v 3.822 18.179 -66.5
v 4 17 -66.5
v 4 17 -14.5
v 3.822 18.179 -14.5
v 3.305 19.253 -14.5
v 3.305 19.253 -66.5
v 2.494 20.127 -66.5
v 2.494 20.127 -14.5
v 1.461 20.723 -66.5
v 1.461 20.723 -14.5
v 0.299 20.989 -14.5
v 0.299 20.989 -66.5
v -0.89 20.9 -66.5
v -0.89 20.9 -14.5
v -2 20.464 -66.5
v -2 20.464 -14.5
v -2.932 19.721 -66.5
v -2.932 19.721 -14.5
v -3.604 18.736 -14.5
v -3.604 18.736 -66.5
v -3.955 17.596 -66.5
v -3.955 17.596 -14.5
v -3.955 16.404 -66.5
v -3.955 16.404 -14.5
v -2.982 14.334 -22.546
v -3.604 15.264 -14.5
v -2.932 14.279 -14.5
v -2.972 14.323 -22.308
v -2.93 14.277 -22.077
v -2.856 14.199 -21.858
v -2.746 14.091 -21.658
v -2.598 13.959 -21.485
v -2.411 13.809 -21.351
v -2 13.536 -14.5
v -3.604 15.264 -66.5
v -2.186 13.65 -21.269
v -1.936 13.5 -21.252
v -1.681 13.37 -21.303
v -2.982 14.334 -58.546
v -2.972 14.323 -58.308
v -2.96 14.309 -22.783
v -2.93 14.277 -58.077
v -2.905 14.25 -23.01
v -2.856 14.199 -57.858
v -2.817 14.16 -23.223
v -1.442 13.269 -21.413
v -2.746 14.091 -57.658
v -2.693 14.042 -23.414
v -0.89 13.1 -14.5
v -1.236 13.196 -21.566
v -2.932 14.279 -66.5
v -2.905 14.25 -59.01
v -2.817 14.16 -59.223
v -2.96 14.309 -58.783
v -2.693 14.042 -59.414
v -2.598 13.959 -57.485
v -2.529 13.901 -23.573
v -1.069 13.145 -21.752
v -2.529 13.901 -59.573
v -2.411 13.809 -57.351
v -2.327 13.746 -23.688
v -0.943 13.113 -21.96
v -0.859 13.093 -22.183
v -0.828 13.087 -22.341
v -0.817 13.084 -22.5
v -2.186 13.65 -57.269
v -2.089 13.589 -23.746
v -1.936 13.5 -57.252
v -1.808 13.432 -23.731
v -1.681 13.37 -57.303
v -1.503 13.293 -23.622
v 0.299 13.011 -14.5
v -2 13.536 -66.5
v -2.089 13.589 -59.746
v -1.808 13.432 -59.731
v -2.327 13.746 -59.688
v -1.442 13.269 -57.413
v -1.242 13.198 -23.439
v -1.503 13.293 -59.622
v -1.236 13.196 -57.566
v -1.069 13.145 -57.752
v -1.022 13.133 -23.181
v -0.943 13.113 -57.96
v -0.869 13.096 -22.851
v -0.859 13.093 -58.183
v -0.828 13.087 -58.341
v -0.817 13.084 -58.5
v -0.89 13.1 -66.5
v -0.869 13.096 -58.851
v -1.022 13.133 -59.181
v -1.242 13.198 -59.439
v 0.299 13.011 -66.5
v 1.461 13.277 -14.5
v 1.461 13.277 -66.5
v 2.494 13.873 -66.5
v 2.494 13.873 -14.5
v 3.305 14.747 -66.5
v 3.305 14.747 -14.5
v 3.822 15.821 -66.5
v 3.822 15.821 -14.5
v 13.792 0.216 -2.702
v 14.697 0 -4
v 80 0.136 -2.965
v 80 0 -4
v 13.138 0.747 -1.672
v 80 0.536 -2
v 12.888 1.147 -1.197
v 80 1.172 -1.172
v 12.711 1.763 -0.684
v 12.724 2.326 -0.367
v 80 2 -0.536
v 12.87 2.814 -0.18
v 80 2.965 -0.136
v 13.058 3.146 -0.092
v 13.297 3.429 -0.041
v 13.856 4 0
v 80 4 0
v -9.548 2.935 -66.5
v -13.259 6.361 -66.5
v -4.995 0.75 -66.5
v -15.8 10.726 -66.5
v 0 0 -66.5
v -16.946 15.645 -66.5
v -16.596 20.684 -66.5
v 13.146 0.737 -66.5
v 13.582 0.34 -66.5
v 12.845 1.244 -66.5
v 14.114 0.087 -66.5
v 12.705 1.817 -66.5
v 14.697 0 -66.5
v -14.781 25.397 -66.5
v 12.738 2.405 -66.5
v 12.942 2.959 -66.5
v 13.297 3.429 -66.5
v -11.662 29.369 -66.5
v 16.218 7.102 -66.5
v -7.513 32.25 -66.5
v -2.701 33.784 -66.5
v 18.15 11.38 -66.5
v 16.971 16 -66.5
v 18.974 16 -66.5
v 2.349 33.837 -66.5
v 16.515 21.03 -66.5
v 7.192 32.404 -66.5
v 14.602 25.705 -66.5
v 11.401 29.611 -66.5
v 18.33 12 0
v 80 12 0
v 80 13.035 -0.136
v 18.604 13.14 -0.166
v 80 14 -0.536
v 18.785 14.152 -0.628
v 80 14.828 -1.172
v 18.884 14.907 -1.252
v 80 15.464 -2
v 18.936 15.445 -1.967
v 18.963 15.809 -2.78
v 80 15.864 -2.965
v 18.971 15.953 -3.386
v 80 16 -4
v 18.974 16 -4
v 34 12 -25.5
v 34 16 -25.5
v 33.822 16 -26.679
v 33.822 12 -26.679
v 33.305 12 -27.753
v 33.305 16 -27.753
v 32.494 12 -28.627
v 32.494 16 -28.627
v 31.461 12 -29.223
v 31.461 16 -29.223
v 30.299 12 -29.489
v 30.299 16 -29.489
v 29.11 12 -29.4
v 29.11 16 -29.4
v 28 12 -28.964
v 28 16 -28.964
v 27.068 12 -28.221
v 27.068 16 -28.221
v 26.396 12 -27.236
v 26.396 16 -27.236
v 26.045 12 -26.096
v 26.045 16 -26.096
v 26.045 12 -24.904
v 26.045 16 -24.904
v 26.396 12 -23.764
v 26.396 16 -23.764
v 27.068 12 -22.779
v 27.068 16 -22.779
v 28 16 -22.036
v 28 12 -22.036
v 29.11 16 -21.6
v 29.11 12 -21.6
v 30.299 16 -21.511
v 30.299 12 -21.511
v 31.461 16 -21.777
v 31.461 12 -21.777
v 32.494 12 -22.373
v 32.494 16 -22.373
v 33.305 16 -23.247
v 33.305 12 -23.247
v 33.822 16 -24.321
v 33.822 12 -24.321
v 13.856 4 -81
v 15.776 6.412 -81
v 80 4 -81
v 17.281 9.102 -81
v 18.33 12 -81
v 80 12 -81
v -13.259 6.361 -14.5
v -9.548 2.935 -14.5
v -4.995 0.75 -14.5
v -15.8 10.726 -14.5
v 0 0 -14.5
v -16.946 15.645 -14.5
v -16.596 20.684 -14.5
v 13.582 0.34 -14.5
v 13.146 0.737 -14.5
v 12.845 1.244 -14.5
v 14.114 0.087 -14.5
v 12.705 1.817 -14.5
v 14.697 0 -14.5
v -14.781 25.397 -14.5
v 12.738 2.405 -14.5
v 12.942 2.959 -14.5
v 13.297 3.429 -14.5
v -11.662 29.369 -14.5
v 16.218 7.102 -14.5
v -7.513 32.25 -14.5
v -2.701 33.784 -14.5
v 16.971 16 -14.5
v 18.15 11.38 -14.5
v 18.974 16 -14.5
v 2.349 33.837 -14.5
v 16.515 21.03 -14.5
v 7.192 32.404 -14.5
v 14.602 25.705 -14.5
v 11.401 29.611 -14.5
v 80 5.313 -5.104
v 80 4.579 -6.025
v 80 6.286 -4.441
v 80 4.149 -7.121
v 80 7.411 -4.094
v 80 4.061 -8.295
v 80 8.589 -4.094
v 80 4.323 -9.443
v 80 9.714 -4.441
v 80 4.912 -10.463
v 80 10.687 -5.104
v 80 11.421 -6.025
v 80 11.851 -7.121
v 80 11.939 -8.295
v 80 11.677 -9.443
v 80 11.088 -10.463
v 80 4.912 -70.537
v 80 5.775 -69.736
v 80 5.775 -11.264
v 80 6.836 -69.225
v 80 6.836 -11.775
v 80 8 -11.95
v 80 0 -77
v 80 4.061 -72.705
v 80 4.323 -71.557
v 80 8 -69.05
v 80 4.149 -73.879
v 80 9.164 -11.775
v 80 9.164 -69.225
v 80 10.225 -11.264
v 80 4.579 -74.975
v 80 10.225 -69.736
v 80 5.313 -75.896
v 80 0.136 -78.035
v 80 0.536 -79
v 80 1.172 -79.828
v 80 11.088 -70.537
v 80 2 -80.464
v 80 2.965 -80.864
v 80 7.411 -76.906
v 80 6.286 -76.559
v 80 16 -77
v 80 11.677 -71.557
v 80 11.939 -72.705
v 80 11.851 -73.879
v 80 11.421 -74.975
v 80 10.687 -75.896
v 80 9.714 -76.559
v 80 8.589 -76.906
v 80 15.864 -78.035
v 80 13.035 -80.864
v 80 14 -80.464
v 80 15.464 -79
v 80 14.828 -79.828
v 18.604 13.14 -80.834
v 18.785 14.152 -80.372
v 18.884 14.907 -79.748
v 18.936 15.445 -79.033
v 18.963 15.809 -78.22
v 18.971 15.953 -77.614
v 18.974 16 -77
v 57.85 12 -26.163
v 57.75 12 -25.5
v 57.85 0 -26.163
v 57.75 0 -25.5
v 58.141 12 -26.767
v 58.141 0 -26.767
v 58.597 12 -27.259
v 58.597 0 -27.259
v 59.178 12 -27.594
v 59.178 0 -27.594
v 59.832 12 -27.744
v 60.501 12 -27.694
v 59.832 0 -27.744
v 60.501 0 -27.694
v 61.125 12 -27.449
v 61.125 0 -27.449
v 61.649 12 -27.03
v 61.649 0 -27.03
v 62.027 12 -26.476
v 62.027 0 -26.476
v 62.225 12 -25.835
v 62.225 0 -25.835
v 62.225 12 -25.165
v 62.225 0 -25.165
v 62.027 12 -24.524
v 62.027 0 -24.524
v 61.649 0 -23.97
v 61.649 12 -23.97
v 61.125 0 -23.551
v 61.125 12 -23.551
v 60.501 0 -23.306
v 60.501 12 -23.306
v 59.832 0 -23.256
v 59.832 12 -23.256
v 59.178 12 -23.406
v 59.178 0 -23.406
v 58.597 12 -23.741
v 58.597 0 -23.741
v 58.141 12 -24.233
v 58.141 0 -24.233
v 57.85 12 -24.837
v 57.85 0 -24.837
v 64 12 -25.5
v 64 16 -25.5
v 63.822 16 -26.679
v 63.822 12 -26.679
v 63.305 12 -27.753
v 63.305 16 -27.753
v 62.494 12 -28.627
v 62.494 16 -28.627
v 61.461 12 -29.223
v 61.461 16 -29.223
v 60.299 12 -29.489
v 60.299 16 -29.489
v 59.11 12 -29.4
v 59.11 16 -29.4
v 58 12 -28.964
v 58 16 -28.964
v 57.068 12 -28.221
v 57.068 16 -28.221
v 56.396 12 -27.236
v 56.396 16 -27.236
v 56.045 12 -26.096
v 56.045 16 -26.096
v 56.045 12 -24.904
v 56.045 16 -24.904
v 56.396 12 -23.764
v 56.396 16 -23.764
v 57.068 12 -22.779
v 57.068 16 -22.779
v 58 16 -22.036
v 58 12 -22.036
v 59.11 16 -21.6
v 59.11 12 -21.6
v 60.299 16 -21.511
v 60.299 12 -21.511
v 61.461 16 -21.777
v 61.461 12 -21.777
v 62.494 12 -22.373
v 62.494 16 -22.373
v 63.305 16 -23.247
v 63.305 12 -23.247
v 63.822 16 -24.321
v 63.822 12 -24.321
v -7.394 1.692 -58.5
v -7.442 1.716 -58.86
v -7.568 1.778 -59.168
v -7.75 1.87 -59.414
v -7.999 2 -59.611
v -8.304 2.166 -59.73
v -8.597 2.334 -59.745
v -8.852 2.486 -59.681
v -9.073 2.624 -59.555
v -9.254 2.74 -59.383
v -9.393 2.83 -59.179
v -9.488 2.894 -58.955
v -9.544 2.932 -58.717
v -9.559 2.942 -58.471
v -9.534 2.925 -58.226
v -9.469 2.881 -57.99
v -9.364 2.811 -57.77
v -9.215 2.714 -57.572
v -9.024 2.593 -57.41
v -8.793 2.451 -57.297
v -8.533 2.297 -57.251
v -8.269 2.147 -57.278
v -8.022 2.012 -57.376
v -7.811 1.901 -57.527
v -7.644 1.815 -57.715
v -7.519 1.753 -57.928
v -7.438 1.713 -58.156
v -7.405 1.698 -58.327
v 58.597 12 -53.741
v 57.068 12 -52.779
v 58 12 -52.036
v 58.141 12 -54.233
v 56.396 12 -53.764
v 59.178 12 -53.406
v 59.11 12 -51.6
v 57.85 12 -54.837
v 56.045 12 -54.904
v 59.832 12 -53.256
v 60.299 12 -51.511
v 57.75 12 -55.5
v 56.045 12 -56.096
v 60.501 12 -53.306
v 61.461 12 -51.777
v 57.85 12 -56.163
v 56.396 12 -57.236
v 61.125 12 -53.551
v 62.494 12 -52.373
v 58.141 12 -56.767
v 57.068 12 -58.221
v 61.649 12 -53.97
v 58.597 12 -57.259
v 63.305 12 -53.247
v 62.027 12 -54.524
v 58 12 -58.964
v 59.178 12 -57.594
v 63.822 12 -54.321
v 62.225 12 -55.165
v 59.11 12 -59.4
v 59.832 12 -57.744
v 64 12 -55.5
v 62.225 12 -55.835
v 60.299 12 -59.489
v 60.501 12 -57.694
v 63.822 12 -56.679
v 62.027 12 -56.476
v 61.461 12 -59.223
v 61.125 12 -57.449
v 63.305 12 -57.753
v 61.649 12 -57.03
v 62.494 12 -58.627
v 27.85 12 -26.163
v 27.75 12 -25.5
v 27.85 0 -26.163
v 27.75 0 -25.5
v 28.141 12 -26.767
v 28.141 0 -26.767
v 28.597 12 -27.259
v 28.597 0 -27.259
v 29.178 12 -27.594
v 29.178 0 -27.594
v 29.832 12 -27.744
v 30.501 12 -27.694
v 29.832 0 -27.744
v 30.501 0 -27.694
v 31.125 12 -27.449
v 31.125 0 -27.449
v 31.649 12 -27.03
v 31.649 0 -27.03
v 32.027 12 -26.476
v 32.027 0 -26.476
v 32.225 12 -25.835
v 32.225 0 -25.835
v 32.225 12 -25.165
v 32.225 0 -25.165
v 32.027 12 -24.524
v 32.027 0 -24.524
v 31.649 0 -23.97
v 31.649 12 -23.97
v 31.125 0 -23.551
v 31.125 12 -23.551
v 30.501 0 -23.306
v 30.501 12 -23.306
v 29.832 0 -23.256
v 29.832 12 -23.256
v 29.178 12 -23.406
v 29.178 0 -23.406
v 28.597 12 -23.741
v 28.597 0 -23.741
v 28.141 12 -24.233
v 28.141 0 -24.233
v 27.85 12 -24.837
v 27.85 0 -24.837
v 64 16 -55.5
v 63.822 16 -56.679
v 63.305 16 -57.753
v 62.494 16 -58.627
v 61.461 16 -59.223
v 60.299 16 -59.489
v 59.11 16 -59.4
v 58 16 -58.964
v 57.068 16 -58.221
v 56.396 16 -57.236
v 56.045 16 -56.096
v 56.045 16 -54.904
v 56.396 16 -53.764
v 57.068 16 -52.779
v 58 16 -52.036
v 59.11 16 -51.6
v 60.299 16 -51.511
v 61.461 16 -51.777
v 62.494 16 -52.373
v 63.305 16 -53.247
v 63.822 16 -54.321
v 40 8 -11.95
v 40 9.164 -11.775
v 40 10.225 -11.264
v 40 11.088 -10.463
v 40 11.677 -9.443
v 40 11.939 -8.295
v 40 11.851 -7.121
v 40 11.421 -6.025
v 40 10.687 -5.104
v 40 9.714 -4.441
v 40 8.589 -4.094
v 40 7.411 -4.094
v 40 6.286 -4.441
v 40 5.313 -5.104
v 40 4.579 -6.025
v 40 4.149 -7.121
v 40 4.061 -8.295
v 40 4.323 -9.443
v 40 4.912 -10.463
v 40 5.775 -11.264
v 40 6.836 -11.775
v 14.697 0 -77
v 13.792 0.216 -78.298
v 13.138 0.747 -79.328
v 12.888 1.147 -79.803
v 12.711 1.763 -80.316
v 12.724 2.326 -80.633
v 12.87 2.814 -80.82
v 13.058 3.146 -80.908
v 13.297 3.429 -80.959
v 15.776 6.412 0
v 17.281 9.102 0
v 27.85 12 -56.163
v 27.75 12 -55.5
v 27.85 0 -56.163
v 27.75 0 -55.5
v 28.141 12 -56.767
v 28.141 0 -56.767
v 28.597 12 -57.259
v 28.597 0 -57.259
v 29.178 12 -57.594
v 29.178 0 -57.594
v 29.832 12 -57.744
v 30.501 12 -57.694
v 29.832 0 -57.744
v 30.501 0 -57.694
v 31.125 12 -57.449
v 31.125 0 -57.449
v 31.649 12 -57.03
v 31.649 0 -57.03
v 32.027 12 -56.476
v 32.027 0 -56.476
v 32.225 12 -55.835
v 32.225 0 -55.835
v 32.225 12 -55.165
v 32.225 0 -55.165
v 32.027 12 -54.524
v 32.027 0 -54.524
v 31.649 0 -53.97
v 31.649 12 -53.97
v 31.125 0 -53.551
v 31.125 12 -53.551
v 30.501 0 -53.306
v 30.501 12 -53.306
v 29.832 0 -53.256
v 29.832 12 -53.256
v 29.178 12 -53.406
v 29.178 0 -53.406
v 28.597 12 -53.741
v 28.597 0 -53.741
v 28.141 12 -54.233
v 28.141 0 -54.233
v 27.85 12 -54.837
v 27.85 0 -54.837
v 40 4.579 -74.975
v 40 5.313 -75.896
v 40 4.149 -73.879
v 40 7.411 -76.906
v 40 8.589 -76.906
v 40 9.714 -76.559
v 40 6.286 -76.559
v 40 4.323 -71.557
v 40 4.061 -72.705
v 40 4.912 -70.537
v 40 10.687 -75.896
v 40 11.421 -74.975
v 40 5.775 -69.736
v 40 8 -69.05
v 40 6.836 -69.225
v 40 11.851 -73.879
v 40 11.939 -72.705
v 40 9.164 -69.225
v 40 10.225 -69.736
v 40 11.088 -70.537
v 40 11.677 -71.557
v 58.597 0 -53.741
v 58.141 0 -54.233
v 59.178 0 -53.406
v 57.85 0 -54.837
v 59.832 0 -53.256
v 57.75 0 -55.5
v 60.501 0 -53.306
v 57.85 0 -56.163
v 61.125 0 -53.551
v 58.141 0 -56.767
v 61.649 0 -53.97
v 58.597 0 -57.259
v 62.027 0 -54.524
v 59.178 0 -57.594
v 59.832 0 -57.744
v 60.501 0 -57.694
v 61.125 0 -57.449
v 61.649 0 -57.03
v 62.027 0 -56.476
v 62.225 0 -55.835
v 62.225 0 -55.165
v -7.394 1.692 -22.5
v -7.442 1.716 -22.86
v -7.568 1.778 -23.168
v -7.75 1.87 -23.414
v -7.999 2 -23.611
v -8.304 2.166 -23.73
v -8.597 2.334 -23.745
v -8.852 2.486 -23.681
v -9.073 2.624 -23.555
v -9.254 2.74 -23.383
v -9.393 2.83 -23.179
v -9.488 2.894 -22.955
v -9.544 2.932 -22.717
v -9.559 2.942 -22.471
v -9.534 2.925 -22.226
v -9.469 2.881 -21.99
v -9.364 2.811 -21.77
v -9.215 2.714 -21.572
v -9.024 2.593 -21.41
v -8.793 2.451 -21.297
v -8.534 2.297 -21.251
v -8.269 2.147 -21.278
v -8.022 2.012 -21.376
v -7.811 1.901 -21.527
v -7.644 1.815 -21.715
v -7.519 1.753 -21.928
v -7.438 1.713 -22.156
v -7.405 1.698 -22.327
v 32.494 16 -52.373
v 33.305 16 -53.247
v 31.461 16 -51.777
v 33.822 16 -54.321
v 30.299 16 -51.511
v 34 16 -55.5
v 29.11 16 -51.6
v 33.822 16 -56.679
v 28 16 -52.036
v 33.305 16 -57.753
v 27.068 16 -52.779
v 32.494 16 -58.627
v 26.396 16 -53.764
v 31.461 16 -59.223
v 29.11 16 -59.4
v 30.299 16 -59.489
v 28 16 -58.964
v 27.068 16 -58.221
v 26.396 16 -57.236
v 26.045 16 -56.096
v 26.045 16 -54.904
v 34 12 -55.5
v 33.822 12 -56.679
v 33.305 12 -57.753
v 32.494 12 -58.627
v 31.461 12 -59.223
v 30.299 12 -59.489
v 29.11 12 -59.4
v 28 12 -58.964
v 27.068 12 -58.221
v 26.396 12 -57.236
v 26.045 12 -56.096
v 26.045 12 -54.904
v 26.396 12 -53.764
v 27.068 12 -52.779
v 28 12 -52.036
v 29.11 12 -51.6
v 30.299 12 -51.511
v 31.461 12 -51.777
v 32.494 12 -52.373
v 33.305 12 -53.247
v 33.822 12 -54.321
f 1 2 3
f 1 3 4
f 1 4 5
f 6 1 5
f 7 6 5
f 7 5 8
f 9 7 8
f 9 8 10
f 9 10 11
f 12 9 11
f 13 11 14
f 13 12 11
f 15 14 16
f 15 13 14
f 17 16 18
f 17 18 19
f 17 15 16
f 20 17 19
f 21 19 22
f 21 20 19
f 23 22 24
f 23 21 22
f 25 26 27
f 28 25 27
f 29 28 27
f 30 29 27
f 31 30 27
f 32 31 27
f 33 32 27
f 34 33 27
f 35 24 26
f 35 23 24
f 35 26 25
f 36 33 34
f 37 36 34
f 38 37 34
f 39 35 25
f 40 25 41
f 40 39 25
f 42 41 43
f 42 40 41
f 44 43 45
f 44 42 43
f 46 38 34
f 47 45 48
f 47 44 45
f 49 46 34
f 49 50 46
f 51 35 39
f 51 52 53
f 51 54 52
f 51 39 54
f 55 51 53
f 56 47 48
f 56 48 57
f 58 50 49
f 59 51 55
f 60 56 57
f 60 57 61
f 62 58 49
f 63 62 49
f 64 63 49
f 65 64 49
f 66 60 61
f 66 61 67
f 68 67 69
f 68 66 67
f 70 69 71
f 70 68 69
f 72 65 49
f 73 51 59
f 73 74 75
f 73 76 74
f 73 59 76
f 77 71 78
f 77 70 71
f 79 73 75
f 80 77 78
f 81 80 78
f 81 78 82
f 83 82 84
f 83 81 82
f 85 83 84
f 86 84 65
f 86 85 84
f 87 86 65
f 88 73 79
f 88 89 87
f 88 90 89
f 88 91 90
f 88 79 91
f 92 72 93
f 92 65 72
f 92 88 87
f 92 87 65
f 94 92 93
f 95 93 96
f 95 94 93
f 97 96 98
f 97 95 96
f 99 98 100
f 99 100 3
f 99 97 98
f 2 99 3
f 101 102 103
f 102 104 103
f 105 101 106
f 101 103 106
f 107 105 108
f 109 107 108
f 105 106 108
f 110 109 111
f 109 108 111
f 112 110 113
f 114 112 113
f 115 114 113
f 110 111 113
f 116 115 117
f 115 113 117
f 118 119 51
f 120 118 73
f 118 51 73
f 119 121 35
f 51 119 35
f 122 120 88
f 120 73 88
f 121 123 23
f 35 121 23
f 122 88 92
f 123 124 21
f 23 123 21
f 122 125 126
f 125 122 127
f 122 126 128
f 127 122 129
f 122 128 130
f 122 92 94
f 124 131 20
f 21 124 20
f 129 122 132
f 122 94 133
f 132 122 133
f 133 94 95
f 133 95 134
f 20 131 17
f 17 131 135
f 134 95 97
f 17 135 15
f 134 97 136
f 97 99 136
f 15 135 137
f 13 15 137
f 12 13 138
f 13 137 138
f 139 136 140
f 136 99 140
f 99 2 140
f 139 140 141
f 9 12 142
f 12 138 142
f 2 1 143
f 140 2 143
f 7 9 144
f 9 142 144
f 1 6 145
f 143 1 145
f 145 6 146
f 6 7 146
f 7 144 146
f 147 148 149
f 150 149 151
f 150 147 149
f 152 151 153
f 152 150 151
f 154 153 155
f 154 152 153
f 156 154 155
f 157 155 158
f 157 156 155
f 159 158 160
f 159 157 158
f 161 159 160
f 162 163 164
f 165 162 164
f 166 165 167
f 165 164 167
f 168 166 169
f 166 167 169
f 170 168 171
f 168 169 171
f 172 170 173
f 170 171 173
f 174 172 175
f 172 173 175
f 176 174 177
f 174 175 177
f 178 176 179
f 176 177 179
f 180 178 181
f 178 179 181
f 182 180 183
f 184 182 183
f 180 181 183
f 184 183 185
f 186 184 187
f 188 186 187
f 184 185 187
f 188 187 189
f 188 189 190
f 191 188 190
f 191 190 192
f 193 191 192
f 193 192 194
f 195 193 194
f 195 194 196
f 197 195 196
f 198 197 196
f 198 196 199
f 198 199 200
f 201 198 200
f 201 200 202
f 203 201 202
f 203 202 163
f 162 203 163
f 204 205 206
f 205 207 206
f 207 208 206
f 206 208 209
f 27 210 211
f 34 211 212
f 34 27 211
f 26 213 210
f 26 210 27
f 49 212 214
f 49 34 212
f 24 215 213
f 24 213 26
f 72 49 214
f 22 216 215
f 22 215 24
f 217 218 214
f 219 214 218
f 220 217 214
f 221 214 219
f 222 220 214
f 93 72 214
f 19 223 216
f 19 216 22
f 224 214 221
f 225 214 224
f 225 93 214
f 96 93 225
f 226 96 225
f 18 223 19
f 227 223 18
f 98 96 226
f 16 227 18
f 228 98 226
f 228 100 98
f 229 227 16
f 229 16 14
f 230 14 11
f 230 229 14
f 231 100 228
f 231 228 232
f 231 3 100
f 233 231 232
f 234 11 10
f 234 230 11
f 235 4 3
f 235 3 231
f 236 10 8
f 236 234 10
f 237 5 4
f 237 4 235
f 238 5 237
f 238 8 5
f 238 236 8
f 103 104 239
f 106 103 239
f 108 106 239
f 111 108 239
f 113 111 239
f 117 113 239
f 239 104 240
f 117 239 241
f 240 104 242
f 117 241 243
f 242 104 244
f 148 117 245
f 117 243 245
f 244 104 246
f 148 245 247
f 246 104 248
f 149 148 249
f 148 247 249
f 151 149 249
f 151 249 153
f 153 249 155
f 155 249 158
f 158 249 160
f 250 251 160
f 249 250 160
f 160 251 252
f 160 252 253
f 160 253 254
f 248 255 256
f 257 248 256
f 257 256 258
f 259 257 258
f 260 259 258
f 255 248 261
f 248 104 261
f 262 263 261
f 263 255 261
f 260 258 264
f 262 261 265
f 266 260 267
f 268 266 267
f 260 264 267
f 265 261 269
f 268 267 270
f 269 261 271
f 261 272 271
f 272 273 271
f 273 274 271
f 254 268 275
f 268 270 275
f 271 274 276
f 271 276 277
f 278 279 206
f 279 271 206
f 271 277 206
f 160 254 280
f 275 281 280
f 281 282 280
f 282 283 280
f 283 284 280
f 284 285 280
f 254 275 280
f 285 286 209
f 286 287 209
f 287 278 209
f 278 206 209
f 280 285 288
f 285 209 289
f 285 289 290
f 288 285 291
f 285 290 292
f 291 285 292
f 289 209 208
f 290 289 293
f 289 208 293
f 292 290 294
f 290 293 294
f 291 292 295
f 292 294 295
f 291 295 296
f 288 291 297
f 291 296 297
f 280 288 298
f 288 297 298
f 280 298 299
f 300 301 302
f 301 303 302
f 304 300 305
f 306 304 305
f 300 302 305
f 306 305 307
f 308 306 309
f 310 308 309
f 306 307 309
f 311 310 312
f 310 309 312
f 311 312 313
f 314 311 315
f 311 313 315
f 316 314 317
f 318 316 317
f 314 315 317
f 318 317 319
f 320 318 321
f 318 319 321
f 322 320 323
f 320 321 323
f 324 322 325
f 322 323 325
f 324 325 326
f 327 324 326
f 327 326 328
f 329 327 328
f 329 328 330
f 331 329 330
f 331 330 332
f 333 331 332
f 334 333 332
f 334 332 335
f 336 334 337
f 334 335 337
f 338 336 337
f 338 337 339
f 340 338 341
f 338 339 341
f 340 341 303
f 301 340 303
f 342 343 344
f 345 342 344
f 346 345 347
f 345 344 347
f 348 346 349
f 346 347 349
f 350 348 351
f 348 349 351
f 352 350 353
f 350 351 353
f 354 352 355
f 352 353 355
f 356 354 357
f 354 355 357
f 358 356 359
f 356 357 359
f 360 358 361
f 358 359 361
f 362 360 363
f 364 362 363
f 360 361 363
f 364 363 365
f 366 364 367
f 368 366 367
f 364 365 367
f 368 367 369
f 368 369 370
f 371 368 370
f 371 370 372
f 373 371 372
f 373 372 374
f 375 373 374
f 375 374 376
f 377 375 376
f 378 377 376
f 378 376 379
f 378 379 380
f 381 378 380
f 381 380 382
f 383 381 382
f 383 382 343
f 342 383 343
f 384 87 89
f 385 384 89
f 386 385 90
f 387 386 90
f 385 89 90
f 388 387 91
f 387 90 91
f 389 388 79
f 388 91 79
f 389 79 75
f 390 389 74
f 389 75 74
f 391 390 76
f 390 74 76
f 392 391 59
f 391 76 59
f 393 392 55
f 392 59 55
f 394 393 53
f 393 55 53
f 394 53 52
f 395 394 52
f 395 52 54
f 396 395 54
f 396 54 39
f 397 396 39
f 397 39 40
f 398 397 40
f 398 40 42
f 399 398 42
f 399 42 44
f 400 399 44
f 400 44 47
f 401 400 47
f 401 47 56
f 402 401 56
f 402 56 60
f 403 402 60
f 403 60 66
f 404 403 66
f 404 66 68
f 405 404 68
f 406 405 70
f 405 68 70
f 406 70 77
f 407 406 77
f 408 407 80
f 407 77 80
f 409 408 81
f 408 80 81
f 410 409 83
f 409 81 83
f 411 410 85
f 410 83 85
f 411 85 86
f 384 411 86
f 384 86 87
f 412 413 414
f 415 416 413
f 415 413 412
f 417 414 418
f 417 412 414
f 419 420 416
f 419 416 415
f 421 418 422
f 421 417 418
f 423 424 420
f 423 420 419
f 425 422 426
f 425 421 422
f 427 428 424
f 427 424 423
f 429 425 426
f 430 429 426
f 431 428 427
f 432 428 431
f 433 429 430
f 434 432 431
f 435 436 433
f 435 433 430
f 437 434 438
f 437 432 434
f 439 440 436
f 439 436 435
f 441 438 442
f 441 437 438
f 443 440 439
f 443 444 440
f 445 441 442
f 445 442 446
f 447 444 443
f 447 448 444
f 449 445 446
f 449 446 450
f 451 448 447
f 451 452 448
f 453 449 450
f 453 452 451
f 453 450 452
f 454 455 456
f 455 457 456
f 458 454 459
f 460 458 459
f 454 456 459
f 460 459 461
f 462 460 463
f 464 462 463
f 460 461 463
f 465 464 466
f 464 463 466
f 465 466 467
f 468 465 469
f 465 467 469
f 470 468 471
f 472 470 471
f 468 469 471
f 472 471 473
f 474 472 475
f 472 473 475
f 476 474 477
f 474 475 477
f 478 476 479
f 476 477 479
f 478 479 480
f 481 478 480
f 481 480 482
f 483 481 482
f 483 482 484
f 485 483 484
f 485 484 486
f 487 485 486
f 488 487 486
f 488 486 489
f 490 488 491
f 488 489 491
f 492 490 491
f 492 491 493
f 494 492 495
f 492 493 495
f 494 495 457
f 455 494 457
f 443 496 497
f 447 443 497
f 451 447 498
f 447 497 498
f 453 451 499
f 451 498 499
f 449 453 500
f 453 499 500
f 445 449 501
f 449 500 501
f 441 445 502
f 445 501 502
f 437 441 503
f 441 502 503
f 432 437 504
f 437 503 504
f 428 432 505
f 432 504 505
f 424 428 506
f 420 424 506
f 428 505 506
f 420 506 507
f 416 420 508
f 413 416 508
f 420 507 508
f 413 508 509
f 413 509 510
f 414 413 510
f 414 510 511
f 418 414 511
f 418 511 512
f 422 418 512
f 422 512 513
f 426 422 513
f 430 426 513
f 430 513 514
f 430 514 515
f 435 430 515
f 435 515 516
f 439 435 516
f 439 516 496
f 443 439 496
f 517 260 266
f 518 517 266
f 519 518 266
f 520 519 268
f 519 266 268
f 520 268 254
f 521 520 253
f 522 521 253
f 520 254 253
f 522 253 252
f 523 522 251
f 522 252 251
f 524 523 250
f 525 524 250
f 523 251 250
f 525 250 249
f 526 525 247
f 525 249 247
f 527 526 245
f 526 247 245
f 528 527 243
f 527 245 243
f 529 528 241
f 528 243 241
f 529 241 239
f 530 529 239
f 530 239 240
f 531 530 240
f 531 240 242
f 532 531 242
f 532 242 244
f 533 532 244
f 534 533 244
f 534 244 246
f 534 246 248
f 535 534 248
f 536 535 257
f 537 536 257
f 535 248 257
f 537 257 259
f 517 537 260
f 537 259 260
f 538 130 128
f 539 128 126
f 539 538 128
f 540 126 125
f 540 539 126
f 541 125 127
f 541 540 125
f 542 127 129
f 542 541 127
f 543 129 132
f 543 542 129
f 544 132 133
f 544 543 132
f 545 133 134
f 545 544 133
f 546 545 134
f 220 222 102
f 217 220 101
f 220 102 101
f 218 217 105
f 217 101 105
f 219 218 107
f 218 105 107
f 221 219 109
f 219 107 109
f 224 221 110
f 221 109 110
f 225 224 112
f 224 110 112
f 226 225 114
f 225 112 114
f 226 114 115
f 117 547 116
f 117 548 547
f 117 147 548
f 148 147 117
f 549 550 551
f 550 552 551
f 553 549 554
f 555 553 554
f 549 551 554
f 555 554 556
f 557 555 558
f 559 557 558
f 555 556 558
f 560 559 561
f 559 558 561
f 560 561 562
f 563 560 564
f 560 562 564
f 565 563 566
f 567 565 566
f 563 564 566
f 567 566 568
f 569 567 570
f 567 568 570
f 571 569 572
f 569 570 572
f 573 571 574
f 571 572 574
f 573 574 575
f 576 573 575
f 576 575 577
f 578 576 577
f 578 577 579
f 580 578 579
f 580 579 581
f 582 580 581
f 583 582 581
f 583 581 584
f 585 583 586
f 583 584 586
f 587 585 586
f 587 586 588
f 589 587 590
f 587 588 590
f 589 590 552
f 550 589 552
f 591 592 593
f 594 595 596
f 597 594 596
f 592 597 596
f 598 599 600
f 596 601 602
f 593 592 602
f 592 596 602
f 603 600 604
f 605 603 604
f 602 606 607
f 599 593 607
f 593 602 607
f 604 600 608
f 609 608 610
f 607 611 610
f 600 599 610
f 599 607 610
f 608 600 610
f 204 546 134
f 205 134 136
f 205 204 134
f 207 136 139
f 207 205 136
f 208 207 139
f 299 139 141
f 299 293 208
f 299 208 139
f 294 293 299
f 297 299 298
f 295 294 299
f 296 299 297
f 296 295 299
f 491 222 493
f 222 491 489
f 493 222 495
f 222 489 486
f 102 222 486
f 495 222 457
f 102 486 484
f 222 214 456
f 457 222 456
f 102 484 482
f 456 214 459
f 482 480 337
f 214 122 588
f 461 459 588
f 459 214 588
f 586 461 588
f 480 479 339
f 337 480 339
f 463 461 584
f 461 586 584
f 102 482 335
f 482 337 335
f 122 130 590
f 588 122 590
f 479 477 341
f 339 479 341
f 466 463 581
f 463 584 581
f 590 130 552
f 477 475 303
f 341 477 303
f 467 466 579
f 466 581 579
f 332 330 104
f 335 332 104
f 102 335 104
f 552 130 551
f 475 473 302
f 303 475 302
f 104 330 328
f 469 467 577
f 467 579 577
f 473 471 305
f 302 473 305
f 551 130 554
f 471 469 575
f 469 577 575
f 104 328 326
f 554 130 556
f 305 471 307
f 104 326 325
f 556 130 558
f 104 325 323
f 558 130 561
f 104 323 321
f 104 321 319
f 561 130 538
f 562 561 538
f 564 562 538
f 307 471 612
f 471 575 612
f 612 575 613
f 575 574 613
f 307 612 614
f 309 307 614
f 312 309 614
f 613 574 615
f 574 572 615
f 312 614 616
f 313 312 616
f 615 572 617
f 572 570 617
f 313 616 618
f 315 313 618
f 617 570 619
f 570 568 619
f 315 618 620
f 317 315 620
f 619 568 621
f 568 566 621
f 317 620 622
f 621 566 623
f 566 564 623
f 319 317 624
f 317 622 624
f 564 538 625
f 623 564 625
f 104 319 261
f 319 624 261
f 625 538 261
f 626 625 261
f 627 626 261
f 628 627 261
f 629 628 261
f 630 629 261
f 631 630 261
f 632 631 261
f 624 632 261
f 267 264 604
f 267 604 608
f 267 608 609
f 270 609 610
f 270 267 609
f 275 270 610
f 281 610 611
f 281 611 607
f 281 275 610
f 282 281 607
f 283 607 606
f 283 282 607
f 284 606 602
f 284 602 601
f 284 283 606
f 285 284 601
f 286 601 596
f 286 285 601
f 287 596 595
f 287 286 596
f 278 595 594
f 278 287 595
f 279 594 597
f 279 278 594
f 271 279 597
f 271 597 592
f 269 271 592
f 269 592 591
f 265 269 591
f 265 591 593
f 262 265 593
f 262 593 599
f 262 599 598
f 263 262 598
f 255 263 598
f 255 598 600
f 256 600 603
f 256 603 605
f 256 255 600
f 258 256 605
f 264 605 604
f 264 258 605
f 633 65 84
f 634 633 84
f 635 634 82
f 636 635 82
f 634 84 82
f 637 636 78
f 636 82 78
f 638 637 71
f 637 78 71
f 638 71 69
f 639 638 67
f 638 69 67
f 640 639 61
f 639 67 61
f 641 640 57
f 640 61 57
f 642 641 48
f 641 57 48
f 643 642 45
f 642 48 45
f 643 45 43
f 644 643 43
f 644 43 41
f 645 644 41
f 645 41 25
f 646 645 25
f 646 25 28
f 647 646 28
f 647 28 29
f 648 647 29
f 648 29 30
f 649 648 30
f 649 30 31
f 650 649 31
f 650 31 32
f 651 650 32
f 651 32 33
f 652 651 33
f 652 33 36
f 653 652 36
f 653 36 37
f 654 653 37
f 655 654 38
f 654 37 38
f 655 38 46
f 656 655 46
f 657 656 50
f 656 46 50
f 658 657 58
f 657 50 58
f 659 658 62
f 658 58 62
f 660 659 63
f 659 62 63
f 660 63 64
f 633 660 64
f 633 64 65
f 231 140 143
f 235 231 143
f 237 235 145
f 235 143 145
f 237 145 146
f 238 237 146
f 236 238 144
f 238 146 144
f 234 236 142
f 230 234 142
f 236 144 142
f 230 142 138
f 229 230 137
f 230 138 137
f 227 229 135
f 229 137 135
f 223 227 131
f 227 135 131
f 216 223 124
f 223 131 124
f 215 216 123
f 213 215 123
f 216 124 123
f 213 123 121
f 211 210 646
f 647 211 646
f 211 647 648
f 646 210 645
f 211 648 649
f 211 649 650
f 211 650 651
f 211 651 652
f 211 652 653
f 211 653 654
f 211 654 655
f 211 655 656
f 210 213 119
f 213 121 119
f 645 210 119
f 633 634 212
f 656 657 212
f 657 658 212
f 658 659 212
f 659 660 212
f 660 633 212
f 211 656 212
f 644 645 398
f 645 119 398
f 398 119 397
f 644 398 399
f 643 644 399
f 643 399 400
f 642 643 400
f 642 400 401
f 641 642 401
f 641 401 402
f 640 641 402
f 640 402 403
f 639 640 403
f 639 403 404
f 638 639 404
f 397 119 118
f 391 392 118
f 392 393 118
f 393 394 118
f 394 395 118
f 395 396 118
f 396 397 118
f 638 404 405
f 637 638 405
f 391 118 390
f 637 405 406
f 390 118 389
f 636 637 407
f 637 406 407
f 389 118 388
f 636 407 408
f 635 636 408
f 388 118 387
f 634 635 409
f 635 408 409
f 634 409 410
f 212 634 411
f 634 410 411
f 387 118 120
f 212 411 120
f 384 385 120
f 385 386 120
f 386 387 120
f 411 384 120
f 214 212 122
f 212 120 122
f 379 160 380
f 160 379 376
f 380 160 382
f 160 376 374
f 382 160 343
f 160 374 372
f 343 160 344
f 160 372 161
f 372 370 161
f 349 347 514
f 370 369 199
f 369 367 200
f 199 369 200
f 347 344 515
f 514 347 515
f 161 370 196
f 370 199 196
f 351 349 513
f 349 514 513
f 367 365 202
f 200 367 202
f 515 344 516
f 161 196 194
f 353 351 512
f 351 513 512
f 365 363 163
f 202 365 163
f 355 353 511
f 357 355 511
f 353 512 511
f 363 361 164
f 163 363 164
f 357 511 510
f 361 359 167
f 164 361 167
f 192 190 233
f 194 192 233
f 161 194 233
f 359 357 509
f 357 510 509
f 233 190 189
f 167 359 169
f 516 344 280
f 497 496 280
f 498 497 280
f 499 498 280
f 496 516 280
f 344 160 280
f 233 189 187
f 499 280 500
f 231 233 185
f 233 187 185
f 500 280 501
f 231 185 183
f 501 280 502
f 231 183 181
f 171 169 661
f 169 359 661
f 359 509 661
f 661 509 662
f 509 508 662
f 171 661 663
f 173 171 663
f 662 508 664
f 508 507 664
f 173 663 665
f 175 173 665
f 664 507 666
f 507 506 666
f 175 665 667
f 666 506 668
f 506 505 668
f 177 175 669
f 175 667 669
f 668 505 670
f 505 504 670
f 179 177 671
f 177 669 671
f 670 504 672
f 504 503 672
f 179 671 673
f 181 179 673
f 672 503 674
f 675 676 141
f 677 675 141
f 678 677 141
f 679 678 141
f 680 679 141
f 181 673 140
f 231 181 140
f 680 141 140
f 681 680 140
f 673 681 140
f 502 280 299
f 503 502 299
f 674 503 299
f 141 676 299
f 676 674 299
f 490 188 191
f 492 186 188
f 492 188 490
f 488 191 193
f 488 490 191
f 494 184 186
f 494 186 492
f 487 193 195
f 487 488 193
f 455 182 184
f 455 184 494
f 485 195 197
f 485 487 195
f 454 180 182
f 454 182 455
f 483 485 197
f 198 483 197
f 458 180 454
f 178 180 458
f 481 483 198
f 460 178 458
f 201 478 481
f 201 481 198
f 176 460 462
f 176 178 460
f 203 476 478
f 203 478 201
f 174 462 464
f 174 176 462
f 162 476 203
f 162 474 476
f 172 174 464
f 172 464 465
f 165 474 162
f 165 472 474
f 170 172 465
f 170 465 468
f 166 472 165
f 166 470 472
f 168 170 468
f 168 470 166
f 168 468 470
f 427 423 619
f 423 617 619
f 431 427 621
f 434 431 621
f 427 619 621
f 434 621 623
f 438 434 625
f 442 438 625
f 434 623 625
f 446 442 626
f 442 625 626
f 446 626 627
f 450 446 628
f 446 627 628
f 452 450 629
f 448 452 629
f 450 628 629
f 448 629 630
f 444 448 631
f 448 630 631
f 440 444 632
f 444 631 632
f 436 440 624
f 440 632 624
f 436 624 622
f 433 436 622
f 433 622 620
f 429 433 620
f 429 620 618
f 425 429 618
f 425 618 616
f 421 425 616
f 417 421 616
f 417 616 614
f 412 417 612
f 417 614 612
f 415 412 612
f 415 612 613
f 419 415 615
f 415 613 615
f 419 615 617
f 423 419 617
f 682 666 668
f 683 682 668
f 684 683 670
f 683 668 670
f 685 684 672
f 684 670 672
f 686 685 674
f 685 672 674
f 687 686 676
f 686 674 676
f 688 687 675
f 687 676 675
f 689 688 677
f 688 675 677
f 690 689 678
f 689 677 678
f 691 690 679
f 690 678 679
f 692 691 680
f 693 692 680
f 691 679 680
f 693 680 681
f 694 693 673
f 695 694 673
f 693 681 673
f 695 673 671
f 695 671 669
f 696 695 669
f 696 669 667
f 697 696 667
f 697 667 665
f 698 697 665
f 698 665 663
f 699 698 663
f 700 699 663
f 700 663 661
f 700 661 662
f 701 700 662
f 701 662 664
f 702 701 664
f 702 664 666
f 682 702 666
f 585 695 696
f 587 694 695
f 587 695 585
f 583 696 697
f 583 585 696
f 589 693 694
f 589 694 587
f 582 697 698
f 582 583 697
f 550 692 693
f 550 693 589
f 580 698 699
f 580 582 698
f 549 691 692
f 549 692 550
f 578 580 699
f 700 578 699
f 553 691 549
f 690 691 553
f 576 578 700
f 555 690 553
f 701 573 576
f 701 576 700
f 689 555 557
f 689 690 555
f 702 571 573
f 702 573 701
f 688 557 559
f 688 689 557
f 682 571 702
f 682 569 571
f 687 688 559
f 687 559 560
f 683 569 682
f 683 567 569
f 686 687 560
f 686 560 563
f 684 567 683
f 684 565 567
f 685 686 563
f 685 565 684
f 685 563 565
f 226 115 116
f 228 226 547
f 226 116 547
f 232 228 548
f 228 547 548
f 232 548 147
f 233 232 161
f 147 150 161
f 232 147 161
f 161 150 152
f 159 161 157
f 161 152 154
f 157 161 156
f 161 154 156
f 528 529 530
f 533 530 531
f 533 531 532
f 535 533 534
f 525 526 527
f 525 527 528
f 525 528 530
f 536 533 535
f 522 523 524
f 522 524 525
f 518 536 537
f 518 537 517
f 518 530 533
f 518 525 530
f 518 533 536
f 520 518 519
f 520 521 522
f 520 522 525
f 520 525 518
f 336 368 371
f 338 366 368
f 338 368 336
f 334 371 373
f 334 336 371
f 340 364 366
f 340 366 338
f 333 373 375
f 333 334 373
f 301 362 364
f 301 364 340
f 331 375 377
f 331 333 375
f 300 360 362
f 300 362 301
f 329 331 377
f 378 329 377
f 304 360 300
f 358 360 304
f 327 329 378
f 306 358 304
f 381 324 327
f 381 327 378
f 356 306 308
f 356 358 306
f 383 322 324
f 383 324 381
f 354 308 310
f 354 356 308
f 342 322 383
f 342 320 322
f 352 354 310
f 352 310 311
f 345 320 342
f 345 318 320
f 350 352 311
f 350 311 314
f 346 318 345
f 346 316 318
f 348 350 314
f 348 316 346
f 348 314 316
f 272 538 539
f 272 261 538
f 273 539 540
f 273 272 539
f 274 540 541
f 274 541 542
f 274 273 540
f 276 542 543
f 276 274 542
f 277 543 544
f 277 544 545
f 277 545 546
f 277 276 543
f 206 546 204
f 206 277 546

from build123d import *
from OCP.BRepFilletAPI import BRepFilletAPI_MakeFillet

# Parameters (mm, degrees)
BOSS_EXTRUDE2_DEPTH             = 40.5
SKETCH18_R                      = 19
CUT_EXTRUDE7_DEPTH              = 14.5
CUT_EXTRUDE8_REACH              = 92.73
SKETCH19_R                      = 4
SKETCH20_R                      = 3.95
CUT_EXTRUDE10_DEPTH             = 40
FILLET2_R1                      = 4
FILLET2_R2                      = 2
CBORE_FOR_M4_SHCS1_D            = 4.5
CBORE_FOR_M4_SHCS1_CBORE_D      = 8
CBORE_FOR_M4_SHCS1_CBORE_DEPTH  = 4
M3_TAPPED_HOLE1_D               = 2.5
M3_TAPPED_HOLE1_DEPTH           = 17
M3_TAPPED_HOLE1_ON_FACE_2_D     = 2.5
M3_TAPPED_HOLE1_ON_FACE_2_DEPTH = 17


with BuildPart() as part:
    # Sketch11 → Boss-Extrude2 (new body)
    with BuildSketch(Plane.XY):
        with BuildLine():
            Line((0, 0), (80, 0))
            Line((80, 0), (80, 16))
            Line((80, 16), (16.970562748, 16))
            ThreePointArc((16.970562748, 16), (-11.66190379, 29.369316877), (0, 0))
        make_face()
    boss_extrude2 = extrude(amount=-BOSS_EXTRUDE2_DEPTH)

    # Sketch18 → Cut-Extrude7 (cut)
    with BuildSketch(Plane.XY):
        with Locations((0, 17)):
            Circle(SKETCH18_R)
    cut_extrude7 = extrude(amount=-CUT_EXTRUDE7_DEPTH, mode=Mode.SUBTRACT)

    # Sketch19 → Cut-Extrude8 (cut, up to next)
    with BuildSketch(Plane.XY.offset(-14.5), mode=Mode.PRIVATE) as cut_extrude8_sk1:
        with Locations((0, 17)):
            Circle(SKETCH19_R)
    cut_extrude8_tool1 = extrude(cut_extrude8_sk1.sketch, amount=-CUT_EXTRUDE8_REACH, mode=Mode.PRIVATE) & part.part
    cut_extrude8 = cut_extrude8_tool1.solids().sort_by_distance((0, 17, -14.5))[0]
    add(cut_extrude8, mode=Mode.SUBTRACT)

    # Sketch20 → Cut-Extrude10 (cut)
    with BuildSketch(Plane(origin=(80, 0, 0), x_dir=(0, 0, -1), z_dir=(1, 0, 0))):
        with Locations((8, 8)):
            Circle(SKETCH20_R)
    cut_extrude10 = extrude(amount=-CUT_EXTRUDE10_DEPTH, mode=Mode.SUBTRACT)

    # Mirror2: Boss-Extrude2, Cut-Extrude7, Cut-Extrude8, Cut-Extrude10 across plane
    add(boss_extrude2.mirror(Plane(origin=(0, 17, -40.5), x_dir=(1, 0, 0), z_dir=(0, 0, -1))))
    add(cut_extrude7.mirror(Plane(origin=(0, 17, -40.5), x_dir=(1, 0, 0), z_dir=(0, 0, -1))), mode=Mode.SUBTRACT)
    add(cut_extrude8.mirror(Plane(origin=(0, 17, -40.5), x_dir=(1, 0, 0), z_dir=(0, 0, -1))), mode=Mode.SUBTRACT)
    add(cut_extrude10.mirror(Plane(origin=(0, 17, -40.5), x_dir=(1, 0, 0), z_dir=(0, 0, -1))), mode=Mode.SUBTRACT)

    # Fillet2: one fillet with a radius per group of edges: ONE call of the kernel's fillet builder (fillet() takes one radius for all edges)
    fillet2_edges_1 = [part.edges().sort_by_distance(p)[0] for p in [
        (44.242640687, 0, 0),
        (49.486832981, 16, -81),
        (49.486832981, 16, 0),
        (44.242640687, 0, -81),
    ]]
    fillet2_edges_2 = [part.edges().sort_by_distance(p)[0] for p in [
        (8.485281374, 0, -7.25),
        (8.485281374, 0, -73.75),
    ]]
    fillet2 = BRepFilletAPI_MakeFillet(part.part.solid().wrapped)
    for e in fillet2_edges_1:
        fillet2.Add(FILLET2_R1, e.wrapped)
    for e in fillet2_edges_2:
        fillet2.Add(FILLET2_R2, e.wrapped)
    add(Compound.cast(fillet2.Shape()), mode=Mode.REPLACE)

    # CBORE for M4 SHCS1 (through all)
    with Locations(Plane(origin=(0, 16, 0), x_dir=(1, 0, 0), z_dir=(0, 1, 0))):
        with Locations((60, 55.5), (60, 25.5), (30, 25.5), (30, 55.5)):
            CounterBoreHole(CBORE_FOR_M4_SHCS1_D / 2, CBORE_FOR_M4_SHCS1_CBORE_D / 2, CBORE_FOR_M4_SHCS1_CBORE_DEPTH)

    # M3 Tapped Hole1
    with Locations(Plane(origin=(-8.5, 2.277568136, -58.5), x_dir=(-0.866025403784, 0.5, 0), z_dir=(-0.5, -0.866025403784, 0))):
        with Locations((0, 0)):
            Hole(M3_TAPPED_HOLE1_D / 2, depth=M3_TAPPED_HOLE1_DEPTH)

    # M3 Tapped Hole1 on face 2
    with Locations(Plane(origin=(-8.5, 2.277568136, -22.5), x_dir=(-0.866025302838, 0.500000174844, 0), z_dir=(-0.500000174844, -0.866025302838, 0))):
        with Locations((0, 0)):
            Hole(M3_TAPPED_HOLE1_ON_FACE_2_D / 2, depth=M3_TAPPED_HOLE1_ON_FACE_2_DEPTH)


solid = part.part
